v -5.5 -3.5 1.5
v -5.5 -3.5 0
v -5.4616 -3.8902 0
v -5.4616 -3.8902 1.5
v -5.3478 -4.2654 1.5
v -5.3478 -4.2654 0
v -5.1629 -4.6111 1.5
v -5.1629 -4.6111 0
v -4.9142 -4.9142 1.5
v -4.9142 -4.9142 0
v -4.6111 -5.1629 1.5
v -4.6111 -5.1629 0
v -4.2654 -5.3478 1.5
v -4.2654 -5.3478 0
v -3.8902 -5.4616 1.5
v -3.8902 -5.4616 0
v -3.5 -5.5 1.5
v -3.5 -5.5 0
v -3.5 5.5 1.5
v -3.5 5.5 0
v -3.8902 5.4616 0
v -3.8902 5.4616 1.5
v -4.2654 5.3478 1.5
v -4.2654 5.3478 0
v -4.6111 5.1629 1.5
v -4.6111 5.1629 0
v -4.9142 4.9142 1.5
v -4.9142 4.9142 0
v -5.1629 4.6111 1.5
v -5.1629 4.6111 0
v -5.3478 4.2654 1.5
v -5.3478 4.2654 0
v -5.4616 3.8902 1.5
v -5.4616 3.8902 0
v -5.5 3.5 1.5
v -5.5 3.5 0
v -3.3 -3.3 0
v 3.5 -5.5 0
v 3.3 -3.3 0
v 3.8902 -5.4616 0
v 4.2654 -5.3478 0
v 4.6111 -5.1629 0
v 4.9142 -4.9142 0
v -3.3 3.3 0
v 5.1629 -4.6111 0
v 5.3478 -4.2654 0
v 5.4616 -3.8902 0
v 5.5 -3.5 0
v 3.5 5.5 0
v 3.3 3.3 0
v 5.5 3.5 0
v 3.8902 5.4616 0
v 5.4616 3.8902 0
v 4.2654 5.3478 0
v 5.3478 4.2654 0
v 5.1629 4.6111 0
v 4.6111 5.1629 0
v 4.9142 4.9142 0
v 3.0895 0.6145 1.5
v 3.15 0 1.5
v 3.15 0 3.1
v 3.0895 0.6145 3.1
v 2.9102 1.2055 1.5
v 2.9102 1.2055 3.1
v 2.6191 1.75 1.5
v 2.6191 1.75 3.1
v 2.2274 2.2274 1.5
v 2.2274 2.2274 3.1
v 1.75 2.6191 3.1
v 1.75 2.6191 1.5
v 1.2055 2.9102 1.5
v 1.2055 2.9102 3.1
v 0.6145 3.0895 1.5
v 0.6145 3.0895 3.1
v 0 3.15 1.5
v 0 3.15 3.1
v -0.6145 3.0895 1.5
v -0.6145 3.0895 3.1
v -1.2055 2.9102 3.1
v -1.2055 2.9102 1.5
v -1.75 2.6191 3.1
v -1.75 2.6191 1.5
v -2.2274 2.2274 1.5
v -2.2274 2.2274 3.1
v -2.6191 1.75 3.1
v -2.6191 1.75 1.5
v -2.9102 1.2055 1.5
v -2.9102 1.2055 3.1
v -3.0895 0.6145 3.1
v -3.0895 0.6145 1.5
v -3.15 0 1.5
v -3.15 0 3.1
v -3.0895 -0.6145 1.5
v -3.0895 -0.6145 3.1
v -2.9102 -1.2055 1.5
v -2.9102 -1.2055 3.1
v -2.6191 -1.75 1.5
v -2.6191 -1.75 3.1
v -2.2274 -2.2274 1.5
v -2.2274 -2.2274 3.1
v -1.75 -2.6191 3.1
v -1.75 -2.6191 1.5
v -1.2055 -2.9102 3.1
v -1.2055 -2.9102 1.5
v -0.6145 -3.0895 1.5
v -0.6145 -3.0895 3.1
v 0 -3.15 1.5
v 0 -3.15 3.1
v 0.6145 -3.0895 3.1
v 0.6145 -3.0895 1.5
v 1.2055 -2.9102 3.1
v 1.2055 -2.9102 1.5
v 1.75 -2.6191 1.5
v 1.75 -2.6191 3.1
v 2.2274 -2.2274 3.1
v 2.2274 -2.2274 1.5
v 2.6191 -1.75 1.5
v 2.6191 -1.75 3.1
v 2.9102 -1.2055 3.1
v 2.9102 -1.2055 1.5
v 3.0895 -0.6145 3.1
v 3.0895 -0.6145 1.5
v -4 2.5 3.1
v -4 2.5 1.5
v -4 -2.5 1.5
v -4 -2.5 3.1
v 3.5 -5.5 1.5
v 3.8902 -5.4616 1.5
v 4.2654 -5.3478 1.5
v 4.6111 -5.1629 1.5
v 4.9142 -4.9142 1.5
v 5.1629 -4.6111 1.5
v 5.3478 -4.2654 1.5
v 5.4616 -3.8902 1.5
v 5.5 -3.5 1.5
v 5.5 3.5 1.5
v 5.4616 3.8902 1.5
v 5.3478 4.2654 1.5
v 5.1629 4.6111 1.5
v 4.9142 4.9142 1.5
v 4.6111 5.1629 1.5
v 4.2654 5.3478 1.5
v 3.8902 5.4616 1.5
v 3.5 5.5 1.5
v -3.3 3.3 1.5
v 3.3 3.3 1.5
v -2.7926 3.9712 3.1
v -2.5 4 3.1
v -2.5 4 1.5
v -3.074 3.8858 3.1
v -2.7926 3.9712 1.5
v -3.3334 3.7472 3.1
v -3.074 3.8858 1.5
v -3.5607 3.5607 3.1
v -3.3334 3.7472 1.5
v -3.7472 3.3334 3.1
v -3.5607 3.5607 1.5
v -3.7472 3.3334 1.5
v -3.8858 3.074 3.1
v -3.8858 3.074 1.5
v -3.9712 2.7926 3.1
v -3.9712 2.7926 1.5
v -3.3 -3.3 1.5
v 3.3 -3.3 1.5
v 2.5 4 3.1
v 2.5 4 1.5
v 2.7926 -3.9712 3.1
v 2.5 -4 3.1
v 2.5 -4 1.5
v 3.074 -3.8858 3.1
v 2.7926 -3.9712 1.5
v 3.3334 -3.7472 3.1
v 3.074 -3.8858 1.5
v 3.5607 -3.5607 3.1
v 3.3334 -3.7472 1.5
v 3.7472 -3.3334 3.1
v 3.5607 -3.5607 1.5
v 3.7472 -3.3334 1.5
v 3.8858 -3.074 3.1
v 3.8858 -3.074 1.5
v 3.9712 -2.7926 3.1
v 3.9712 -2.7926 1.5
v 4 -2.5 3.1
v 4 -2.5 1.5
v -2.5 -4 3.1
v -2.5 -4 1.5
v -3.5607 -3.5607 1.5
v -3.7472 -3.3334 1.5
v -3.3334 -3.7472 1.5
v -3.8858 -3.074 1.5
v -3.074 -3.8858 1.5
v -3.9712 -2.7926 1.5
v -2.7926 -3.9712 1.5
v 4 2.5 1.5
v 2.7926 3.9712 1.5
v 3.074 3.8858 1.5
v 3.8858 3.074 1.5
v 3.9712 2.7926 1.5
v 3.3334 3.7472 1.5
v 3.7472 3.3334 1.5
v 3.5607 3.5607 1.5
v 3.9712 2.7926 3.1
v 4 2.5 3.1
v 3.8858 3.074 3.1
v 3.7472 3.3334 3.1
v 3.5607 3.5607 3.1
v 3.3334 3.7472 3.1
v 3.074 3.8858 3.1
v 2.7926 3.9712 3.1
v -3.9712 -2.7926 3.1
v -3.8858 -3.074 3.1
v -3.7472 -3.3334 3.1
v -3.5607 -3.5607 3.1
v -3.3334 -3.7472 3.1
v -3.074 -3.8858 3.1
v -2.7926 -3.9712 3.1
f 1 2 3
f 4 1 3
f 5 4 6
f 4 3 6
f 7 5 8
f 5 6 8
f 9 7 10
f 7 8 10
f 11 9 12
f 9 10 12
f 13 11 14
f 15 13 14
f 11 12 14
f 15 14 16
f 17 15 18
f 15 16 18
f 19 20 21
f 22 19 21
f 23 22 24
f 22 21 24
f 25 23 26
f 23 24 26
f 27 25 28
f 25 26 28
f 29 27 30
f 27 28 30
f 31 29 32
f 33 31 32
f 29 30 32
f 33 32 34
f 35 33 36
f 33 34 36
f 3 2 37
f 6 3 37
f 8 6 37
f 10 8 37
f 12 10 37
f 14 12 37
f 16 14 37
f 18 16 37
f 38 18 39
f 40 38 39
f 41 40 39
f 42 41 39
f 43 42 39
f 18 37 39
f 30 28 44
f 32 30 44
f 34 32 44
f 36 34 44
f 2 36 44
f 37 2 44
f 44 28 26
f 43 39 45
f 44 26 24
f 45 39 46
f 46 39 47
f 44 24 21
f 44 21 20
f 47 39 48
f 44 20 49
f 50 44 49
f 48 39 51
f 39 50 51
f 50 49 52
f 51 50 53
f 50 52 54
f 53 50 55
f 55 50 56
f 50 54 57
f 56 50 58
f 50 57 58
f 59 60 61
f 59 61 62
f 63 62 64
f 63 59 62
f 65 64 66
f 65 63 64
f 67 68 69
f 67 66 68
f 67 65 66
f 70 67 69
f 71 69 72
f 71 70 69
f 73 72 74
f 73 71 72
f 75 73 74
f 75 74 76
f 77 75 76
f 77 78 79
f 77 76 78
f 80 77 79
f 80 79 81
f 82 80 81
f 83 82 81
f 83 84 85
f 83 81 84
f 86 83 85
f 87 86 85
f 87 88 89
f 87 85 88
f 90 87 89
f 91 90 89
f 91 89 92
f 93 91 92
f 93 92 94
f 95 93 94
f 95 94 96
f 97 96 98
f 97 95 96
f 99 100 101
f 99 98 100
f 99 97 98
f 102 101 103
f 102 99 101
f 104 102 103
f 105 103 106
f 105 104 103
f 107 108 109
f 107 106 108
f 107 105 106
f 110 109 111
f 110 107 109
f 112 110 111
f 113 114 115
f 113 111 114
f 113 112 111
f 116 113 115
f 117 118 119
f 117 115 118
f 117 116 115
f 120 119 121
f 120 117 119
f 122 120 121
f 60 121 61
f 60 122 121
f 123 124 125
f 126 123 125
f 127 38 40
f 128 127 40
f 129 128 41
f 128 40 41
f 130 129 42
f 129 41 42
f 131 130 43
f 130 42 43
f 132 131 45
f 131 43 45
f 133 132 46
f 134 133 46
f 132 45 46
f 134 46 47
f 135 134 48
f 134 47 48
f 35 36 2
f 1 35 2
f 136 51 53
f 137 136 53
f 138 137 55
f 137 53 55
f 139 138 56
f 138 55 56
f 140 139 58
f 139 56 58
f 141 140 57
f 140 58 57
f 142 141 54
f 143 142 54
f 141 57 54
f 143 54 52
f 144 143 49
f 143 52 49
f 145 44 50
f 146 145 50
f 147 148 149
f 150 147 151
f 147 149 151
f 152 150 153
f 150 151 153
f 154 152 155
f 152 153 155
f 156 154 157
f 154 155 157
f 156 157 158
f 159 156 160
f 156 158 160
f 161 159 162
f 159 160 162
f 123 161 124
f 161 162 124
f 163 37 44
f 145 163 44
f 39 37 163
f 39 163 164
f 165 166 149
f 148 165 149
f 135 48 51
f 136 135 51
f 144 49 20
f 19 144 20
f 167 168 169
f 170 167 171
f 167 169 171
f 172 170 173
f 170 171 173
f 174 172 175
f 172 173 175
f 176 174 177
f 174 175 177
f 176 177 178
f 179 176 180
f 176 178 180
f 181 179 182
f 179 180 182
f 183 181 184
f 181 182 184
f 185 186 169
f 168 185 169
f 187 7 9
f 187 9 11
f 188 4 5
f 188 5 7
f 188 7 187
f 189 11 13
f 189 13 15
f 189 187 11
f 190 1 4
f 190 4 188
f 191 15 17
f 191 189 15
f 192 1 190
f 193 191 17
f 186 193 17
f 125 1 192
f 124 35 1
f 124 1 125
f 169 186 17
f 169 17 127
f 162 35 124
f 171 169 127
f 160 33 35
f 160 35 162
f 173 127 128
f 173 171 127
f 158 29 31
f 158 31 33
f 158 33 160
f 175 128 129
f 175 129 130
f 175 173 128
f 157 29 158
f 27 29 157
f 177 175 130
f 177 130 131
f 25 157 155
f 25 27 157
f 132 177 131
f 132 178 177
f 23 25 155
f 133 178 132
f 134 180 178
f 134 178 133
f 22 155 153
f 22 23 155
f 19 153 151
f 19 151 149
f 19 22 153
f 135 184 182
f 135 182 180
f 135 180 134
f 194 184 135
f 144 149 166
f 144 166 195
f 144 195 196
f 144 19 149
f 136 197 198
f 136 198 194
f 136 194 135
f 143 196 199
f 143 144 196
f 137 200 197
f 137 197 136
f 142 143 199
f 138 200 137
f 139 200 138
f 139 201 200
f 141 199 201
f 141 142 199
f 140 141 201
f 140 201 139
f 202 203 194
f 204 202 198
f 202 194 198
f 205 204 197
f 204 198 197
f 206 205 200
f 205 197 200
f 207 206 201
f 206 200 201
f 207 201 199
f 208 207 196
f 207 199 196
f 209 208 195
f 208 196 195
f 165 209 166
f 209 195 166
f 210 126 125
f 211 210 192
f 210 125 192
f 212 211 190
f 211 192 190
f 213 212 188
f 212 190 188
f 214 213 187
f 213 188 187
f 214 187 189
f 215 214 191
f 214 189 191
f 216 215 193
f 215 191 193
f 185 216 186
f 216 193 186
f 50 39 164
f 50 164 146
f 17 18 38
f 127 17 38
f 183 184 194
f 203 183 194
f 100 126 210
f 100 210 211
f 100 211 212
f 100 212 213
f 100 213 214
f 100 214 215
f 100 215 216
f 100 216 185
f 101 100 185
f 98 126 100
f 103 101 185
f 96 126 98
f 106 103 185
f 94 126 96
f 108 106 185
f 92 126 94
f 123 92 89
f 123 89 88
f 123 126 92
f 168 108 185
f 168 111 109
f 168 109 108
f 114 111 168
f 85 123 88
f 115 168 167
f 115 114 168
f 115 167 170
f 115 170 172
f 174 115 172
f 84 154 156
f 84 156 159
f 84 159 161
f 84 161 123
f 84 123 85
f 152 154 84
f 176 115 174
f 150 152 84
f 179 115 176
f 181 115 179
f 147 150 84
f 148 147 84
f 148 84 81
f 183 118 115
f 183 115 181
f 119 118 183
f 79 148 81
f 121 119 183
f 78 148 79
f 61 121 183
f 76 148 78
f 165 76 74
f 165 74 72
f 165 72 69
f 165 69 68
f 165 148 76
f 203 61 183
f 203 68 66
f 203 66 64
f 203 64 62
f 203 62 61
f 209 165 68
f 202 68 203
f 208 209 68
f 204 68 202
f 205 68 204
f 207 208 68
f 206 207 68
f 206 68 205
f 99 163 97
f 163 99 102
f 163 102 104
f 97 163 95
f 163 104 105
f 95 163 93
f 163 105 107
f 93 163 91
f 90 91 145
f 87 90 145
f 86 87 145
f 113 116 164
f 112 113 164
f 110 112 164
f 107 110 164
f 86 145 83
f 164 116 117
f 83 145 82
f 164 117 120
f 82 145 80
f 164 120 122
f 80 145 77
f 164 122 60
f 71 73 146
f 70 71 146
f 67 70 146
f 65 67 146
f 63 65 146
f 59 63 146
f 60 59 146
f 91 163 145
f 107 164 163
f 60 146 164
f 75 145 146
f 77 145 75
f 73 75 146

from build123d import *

# Parameters (mm, degrees)
F0_W     = 6.6
F0_H     = 6.6
F0_R     = 3.15
F1_DEPTH = 1.5
F2_DEPTH = 3.1
F3_DEPTH = 3.101
F4_DEPTH = 1.5


with BuildPart() as f1:
    # F0 (on Top) → F1 (new body)
    with BuildSketch(Plane.XY):
        with BuildLine():
            Line((3.5, 5.5), (-3.5, 5.5))
            ThreePointArc((-3.5, 5.5), (-4.914214, 4.914214), (-5.5, 3.5))
            Line((-5.5, 3.5), (-5.5, -3.5))
            ThreePointArc((-5.5, -3.5), (-4.914214, -4.914214), (-3.5, -5.5))
            Line((-3.5, -5.5), (3.5, -5.5))
            ThreePointArc((3.5, -5.5), (4.914214, -4.914214), (5.5, -3.5))
            Line((5.5, -3.5), (5.5, 3.5))
            ThreePointArc((5.5, 3.5), (4.914214, 4.914214), (3.5, 5.5))
        make_face()
        with BuildLine():
            ThreePointArc((-4, 2.5), (-3.56066, 3.56066), (-2.5, 4))
            Line((-2.5, 4), (2.5, 4))
            ThreePointArc((2.5, 4), (3.56066, 3.56066), (4, 2.5))
            Line((4, 2.5), (4, -2.5))
            ThreePointArc((4, -2.5), (3.56066, -3.56066), (2.5, -4))
            Line((2.5, -4), (-2.5, -4))
            ThreePointArc((-2.5, -4), (-3.56066, -3.56066), (-4, -2.5))
            Line((-4, -2.5), (-4, 2.5))
        make_face(mode=Mode.SUBTRACT)
        with BuildLine():
            Line((2.5, 4), (-2.5, 4))
            ThreePointArc((-2.5, 4), (-3.56066, 3.56066), (-4, 2.5))
            Line((-4, 2.5), (-4, -2.5))
            ThreePointArc((-4, -2.5), (-3.56066, -3.56066), (-2.5, -4))
            Line((-2.5, -4), (2.5, -4))
            ThreePointArc((2.5, -4), (3.56066, -3.56066), (4, -2.5))
            Line((4, -2.5), (4, 2.5))
            ThreePointArc((4, 2.5), (3.56066, 3.56066), (2.5, 4))
        make_face()
        Rectangle(F0_W, F0_H, mode=Mode.SUBTRACT)
        Rectangle(F0_W, F0_H)
        Circle(F0_R, mode=Mode.SUBTRACT)
        Circle(F0_R)
    extrude(amount=F1_DEPTH)

    # F0 (on Top) → F2 (join)
    with BuildSketch(Plane.XY):
        with BuildLine():
            Line((2.5, 4), (-2.5, 4))
            ThreePointArc((-2.5, 4), (-3.56066, 3.56066), (-4, 2.5))
            Line((-4, 2.5), (-4, -2.5))
            ThreePointArc((-4, -2.5), (-3.56066, -3.56066), (-2.5, -4))
            Line((-2.5, -4), (2.5, -4))
            ThreePointArc((2.5, -4), (3.56066, -3.56066), (4, -2.5))
            Line((4, -2.5), (4, 2.5))
            ThreePointArc((4, 2.5), (3.56066, 3.56066), (2.5, 4))
        make_face()
        Rectangle(F0_W, F0_H, mode=Mode.SUBTRACT)
        Rectangle(F0_W, F0_H)
        Circle(F0_R, mode=Mode.SUBTRACT)
        Circle(F0_R)
    extrude(amount=F2_DEPTH)

    # F0 (on Top) → F3 (cut, through all)
    with BuildSketch(Plane.XY):
        Circle(F0_R)
    extrude(amount=F3_DEPTH, mode=Mode.SUBTRACT)

    # F0 (on Top) → F4 (cut)
    with BuildSketch(Plane.XY):
        Rectangle(F0_W, F0_H)
        Circle(F0_R, mode=Mode.SUBTRACT)
        Circle(F0_R)
    extrude(amount=F4_DEPTH, mode=Mode.SUBTRACT)


solid = f1.part
